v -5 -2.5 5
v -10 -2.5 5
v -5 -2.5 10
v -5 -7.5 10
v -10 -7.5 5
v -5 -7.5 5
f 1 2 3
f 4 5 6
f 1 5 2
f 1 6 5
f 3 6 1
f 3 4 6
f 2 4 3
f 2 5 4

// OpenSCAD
module triangle (r,d){
b = r[0];
h = r[1];
w = r[2];

rotate([90,-90,0])
translate(d)
linear_extrude(height = w, center = true, convexity = 10, twist = 0)
polygon(points=[[0,0],[h,0],[0,b]], paths=[[0,1,2]]);
}
module example003()
{
	cube([5, 5, 21], center = true);
			
	cube([5, 5, 21], center = true);
	
}

//example003();

triangle(d=[5,5,5],r=[5,5,5]);
